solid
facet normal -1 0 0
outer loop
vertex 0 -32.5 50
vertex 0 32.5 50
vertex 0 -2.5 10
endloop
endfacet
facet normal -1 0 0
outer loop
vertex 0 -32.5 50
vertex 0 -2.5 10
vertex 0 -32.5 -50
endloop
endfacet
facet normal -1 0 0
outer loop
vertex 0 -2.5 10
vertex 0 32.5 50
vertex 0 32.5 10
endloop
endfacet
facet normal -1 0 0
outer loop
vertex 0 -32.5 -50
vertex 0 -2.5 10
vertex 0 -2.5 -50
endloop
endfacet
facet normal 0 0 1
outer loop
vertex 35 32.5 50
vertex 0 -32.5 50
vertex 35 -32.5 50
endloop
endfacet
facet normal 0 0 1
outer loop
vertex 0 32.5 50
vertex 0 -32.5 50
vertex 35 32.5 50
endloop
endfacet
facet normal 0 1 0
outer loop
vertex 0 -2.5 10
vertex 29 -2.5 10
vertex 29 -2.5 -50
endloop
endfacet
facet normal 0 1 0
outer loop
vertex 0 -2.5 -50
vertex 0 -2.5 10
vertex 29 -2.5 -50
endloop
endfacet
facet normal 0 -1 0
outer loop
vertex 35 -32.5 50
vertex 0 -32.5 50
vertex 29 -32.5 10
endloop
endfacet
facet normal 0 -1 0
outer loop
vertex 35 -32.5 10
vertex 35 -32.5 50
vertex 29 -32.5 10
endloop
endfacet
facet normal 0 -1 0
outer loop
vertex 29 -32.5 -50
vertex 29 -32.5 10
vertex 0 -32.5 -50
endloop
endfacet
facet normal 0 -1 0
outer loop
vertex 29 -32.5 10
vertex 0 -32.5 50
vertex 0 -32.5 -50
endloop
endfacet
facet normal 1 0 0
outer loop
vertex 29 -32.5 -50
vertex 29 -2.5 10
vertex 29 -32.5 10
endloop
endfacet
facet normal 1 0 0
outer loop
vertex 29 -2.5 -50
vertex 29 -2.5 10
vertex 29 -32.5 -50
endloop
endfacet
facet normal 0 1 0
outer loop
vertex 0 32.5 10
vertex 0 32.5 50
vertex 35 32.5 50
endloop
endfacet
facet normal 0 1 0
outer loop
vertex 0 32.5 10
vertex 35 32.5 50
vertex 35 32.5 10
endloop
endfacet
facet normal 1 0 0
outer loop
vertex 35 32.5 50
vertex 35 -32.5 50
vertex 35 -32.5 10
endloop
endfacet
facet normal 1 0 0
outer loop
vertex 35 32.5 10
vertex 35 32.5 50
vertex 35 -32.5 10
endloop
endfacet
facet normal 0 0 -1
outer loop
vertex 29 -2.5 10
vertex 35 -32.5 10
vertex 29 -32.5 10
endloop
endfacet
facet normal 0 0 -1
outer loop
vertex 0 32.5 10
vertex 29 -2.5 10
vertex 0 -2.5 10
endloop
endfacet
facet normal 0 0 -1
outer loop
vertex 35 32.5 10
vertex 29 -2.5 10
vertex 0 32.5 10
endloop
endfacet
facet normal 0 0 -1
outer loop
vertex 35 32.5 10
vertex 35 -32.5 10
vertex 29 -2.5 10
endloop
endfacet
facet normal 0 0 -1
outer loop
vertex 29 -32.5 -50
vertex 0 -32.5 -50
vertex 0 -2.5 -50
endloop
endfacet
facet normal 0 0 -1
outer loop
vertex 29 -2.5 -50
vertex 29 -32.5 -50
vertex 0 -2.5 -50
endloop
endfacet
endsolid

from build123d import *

# Parameters (mm, degrees)
SKETCH1_W           = 100
SKETCH1_H           = 65
BOSS_EXTRUDE1_DEPTH = 35
SKETCH4_W           = 60
SKETCH4_H           = 30
CUT_EXTRUDE1_DEPTH  = 6
SKETCH5_W           = 60
SKETCH5_H           = 35
CUT_EXTRUDE2_DEPTH  = 70.14658343


with BuildPart() as part:
    # Sketch1 → Boss-Extrude1 (new body)
    with BuildSketch(Plane(origin=(0, 0, 0), x_dir=(0, 0, -1), z_dir=(1, 0, 0))):
        Rectangle(SKETCH1_W, SKETCH1_H)
    extrude(amount=BOSS_EXTRUDE1_DEPTH)

    # Sketch4 → Cut-Extrude1 (cut)
    with BuildSketch(Plane(origin=(35, 0, 0), x_dir=(0, 0, -1), z_dir=(1, 0, 0))):
        with Locations((20, -17.5)):
            Rectangle(SKETCH4_W, SKETCH4_H)
    extrude(amount=-CUT_EXTRUDE1_DEPTH, mode=Mode.SUBTRACT)

    # Sketch5 → Cut-Extrude2 (cut, through all)
    with BuildSketch(Plane(origin=(35, 0, 0), x_dir=(0, 0, -1), z_dir=(1, 0, 0))):
        with Locations((20, 15)):
            Rectangle(SKETCH5_W, SKETCH5_H)
    extrude(amount=-CUT_EXTRUDE2_DEPTH, mode=Mode.SUBTRACT)


solid = part.part
